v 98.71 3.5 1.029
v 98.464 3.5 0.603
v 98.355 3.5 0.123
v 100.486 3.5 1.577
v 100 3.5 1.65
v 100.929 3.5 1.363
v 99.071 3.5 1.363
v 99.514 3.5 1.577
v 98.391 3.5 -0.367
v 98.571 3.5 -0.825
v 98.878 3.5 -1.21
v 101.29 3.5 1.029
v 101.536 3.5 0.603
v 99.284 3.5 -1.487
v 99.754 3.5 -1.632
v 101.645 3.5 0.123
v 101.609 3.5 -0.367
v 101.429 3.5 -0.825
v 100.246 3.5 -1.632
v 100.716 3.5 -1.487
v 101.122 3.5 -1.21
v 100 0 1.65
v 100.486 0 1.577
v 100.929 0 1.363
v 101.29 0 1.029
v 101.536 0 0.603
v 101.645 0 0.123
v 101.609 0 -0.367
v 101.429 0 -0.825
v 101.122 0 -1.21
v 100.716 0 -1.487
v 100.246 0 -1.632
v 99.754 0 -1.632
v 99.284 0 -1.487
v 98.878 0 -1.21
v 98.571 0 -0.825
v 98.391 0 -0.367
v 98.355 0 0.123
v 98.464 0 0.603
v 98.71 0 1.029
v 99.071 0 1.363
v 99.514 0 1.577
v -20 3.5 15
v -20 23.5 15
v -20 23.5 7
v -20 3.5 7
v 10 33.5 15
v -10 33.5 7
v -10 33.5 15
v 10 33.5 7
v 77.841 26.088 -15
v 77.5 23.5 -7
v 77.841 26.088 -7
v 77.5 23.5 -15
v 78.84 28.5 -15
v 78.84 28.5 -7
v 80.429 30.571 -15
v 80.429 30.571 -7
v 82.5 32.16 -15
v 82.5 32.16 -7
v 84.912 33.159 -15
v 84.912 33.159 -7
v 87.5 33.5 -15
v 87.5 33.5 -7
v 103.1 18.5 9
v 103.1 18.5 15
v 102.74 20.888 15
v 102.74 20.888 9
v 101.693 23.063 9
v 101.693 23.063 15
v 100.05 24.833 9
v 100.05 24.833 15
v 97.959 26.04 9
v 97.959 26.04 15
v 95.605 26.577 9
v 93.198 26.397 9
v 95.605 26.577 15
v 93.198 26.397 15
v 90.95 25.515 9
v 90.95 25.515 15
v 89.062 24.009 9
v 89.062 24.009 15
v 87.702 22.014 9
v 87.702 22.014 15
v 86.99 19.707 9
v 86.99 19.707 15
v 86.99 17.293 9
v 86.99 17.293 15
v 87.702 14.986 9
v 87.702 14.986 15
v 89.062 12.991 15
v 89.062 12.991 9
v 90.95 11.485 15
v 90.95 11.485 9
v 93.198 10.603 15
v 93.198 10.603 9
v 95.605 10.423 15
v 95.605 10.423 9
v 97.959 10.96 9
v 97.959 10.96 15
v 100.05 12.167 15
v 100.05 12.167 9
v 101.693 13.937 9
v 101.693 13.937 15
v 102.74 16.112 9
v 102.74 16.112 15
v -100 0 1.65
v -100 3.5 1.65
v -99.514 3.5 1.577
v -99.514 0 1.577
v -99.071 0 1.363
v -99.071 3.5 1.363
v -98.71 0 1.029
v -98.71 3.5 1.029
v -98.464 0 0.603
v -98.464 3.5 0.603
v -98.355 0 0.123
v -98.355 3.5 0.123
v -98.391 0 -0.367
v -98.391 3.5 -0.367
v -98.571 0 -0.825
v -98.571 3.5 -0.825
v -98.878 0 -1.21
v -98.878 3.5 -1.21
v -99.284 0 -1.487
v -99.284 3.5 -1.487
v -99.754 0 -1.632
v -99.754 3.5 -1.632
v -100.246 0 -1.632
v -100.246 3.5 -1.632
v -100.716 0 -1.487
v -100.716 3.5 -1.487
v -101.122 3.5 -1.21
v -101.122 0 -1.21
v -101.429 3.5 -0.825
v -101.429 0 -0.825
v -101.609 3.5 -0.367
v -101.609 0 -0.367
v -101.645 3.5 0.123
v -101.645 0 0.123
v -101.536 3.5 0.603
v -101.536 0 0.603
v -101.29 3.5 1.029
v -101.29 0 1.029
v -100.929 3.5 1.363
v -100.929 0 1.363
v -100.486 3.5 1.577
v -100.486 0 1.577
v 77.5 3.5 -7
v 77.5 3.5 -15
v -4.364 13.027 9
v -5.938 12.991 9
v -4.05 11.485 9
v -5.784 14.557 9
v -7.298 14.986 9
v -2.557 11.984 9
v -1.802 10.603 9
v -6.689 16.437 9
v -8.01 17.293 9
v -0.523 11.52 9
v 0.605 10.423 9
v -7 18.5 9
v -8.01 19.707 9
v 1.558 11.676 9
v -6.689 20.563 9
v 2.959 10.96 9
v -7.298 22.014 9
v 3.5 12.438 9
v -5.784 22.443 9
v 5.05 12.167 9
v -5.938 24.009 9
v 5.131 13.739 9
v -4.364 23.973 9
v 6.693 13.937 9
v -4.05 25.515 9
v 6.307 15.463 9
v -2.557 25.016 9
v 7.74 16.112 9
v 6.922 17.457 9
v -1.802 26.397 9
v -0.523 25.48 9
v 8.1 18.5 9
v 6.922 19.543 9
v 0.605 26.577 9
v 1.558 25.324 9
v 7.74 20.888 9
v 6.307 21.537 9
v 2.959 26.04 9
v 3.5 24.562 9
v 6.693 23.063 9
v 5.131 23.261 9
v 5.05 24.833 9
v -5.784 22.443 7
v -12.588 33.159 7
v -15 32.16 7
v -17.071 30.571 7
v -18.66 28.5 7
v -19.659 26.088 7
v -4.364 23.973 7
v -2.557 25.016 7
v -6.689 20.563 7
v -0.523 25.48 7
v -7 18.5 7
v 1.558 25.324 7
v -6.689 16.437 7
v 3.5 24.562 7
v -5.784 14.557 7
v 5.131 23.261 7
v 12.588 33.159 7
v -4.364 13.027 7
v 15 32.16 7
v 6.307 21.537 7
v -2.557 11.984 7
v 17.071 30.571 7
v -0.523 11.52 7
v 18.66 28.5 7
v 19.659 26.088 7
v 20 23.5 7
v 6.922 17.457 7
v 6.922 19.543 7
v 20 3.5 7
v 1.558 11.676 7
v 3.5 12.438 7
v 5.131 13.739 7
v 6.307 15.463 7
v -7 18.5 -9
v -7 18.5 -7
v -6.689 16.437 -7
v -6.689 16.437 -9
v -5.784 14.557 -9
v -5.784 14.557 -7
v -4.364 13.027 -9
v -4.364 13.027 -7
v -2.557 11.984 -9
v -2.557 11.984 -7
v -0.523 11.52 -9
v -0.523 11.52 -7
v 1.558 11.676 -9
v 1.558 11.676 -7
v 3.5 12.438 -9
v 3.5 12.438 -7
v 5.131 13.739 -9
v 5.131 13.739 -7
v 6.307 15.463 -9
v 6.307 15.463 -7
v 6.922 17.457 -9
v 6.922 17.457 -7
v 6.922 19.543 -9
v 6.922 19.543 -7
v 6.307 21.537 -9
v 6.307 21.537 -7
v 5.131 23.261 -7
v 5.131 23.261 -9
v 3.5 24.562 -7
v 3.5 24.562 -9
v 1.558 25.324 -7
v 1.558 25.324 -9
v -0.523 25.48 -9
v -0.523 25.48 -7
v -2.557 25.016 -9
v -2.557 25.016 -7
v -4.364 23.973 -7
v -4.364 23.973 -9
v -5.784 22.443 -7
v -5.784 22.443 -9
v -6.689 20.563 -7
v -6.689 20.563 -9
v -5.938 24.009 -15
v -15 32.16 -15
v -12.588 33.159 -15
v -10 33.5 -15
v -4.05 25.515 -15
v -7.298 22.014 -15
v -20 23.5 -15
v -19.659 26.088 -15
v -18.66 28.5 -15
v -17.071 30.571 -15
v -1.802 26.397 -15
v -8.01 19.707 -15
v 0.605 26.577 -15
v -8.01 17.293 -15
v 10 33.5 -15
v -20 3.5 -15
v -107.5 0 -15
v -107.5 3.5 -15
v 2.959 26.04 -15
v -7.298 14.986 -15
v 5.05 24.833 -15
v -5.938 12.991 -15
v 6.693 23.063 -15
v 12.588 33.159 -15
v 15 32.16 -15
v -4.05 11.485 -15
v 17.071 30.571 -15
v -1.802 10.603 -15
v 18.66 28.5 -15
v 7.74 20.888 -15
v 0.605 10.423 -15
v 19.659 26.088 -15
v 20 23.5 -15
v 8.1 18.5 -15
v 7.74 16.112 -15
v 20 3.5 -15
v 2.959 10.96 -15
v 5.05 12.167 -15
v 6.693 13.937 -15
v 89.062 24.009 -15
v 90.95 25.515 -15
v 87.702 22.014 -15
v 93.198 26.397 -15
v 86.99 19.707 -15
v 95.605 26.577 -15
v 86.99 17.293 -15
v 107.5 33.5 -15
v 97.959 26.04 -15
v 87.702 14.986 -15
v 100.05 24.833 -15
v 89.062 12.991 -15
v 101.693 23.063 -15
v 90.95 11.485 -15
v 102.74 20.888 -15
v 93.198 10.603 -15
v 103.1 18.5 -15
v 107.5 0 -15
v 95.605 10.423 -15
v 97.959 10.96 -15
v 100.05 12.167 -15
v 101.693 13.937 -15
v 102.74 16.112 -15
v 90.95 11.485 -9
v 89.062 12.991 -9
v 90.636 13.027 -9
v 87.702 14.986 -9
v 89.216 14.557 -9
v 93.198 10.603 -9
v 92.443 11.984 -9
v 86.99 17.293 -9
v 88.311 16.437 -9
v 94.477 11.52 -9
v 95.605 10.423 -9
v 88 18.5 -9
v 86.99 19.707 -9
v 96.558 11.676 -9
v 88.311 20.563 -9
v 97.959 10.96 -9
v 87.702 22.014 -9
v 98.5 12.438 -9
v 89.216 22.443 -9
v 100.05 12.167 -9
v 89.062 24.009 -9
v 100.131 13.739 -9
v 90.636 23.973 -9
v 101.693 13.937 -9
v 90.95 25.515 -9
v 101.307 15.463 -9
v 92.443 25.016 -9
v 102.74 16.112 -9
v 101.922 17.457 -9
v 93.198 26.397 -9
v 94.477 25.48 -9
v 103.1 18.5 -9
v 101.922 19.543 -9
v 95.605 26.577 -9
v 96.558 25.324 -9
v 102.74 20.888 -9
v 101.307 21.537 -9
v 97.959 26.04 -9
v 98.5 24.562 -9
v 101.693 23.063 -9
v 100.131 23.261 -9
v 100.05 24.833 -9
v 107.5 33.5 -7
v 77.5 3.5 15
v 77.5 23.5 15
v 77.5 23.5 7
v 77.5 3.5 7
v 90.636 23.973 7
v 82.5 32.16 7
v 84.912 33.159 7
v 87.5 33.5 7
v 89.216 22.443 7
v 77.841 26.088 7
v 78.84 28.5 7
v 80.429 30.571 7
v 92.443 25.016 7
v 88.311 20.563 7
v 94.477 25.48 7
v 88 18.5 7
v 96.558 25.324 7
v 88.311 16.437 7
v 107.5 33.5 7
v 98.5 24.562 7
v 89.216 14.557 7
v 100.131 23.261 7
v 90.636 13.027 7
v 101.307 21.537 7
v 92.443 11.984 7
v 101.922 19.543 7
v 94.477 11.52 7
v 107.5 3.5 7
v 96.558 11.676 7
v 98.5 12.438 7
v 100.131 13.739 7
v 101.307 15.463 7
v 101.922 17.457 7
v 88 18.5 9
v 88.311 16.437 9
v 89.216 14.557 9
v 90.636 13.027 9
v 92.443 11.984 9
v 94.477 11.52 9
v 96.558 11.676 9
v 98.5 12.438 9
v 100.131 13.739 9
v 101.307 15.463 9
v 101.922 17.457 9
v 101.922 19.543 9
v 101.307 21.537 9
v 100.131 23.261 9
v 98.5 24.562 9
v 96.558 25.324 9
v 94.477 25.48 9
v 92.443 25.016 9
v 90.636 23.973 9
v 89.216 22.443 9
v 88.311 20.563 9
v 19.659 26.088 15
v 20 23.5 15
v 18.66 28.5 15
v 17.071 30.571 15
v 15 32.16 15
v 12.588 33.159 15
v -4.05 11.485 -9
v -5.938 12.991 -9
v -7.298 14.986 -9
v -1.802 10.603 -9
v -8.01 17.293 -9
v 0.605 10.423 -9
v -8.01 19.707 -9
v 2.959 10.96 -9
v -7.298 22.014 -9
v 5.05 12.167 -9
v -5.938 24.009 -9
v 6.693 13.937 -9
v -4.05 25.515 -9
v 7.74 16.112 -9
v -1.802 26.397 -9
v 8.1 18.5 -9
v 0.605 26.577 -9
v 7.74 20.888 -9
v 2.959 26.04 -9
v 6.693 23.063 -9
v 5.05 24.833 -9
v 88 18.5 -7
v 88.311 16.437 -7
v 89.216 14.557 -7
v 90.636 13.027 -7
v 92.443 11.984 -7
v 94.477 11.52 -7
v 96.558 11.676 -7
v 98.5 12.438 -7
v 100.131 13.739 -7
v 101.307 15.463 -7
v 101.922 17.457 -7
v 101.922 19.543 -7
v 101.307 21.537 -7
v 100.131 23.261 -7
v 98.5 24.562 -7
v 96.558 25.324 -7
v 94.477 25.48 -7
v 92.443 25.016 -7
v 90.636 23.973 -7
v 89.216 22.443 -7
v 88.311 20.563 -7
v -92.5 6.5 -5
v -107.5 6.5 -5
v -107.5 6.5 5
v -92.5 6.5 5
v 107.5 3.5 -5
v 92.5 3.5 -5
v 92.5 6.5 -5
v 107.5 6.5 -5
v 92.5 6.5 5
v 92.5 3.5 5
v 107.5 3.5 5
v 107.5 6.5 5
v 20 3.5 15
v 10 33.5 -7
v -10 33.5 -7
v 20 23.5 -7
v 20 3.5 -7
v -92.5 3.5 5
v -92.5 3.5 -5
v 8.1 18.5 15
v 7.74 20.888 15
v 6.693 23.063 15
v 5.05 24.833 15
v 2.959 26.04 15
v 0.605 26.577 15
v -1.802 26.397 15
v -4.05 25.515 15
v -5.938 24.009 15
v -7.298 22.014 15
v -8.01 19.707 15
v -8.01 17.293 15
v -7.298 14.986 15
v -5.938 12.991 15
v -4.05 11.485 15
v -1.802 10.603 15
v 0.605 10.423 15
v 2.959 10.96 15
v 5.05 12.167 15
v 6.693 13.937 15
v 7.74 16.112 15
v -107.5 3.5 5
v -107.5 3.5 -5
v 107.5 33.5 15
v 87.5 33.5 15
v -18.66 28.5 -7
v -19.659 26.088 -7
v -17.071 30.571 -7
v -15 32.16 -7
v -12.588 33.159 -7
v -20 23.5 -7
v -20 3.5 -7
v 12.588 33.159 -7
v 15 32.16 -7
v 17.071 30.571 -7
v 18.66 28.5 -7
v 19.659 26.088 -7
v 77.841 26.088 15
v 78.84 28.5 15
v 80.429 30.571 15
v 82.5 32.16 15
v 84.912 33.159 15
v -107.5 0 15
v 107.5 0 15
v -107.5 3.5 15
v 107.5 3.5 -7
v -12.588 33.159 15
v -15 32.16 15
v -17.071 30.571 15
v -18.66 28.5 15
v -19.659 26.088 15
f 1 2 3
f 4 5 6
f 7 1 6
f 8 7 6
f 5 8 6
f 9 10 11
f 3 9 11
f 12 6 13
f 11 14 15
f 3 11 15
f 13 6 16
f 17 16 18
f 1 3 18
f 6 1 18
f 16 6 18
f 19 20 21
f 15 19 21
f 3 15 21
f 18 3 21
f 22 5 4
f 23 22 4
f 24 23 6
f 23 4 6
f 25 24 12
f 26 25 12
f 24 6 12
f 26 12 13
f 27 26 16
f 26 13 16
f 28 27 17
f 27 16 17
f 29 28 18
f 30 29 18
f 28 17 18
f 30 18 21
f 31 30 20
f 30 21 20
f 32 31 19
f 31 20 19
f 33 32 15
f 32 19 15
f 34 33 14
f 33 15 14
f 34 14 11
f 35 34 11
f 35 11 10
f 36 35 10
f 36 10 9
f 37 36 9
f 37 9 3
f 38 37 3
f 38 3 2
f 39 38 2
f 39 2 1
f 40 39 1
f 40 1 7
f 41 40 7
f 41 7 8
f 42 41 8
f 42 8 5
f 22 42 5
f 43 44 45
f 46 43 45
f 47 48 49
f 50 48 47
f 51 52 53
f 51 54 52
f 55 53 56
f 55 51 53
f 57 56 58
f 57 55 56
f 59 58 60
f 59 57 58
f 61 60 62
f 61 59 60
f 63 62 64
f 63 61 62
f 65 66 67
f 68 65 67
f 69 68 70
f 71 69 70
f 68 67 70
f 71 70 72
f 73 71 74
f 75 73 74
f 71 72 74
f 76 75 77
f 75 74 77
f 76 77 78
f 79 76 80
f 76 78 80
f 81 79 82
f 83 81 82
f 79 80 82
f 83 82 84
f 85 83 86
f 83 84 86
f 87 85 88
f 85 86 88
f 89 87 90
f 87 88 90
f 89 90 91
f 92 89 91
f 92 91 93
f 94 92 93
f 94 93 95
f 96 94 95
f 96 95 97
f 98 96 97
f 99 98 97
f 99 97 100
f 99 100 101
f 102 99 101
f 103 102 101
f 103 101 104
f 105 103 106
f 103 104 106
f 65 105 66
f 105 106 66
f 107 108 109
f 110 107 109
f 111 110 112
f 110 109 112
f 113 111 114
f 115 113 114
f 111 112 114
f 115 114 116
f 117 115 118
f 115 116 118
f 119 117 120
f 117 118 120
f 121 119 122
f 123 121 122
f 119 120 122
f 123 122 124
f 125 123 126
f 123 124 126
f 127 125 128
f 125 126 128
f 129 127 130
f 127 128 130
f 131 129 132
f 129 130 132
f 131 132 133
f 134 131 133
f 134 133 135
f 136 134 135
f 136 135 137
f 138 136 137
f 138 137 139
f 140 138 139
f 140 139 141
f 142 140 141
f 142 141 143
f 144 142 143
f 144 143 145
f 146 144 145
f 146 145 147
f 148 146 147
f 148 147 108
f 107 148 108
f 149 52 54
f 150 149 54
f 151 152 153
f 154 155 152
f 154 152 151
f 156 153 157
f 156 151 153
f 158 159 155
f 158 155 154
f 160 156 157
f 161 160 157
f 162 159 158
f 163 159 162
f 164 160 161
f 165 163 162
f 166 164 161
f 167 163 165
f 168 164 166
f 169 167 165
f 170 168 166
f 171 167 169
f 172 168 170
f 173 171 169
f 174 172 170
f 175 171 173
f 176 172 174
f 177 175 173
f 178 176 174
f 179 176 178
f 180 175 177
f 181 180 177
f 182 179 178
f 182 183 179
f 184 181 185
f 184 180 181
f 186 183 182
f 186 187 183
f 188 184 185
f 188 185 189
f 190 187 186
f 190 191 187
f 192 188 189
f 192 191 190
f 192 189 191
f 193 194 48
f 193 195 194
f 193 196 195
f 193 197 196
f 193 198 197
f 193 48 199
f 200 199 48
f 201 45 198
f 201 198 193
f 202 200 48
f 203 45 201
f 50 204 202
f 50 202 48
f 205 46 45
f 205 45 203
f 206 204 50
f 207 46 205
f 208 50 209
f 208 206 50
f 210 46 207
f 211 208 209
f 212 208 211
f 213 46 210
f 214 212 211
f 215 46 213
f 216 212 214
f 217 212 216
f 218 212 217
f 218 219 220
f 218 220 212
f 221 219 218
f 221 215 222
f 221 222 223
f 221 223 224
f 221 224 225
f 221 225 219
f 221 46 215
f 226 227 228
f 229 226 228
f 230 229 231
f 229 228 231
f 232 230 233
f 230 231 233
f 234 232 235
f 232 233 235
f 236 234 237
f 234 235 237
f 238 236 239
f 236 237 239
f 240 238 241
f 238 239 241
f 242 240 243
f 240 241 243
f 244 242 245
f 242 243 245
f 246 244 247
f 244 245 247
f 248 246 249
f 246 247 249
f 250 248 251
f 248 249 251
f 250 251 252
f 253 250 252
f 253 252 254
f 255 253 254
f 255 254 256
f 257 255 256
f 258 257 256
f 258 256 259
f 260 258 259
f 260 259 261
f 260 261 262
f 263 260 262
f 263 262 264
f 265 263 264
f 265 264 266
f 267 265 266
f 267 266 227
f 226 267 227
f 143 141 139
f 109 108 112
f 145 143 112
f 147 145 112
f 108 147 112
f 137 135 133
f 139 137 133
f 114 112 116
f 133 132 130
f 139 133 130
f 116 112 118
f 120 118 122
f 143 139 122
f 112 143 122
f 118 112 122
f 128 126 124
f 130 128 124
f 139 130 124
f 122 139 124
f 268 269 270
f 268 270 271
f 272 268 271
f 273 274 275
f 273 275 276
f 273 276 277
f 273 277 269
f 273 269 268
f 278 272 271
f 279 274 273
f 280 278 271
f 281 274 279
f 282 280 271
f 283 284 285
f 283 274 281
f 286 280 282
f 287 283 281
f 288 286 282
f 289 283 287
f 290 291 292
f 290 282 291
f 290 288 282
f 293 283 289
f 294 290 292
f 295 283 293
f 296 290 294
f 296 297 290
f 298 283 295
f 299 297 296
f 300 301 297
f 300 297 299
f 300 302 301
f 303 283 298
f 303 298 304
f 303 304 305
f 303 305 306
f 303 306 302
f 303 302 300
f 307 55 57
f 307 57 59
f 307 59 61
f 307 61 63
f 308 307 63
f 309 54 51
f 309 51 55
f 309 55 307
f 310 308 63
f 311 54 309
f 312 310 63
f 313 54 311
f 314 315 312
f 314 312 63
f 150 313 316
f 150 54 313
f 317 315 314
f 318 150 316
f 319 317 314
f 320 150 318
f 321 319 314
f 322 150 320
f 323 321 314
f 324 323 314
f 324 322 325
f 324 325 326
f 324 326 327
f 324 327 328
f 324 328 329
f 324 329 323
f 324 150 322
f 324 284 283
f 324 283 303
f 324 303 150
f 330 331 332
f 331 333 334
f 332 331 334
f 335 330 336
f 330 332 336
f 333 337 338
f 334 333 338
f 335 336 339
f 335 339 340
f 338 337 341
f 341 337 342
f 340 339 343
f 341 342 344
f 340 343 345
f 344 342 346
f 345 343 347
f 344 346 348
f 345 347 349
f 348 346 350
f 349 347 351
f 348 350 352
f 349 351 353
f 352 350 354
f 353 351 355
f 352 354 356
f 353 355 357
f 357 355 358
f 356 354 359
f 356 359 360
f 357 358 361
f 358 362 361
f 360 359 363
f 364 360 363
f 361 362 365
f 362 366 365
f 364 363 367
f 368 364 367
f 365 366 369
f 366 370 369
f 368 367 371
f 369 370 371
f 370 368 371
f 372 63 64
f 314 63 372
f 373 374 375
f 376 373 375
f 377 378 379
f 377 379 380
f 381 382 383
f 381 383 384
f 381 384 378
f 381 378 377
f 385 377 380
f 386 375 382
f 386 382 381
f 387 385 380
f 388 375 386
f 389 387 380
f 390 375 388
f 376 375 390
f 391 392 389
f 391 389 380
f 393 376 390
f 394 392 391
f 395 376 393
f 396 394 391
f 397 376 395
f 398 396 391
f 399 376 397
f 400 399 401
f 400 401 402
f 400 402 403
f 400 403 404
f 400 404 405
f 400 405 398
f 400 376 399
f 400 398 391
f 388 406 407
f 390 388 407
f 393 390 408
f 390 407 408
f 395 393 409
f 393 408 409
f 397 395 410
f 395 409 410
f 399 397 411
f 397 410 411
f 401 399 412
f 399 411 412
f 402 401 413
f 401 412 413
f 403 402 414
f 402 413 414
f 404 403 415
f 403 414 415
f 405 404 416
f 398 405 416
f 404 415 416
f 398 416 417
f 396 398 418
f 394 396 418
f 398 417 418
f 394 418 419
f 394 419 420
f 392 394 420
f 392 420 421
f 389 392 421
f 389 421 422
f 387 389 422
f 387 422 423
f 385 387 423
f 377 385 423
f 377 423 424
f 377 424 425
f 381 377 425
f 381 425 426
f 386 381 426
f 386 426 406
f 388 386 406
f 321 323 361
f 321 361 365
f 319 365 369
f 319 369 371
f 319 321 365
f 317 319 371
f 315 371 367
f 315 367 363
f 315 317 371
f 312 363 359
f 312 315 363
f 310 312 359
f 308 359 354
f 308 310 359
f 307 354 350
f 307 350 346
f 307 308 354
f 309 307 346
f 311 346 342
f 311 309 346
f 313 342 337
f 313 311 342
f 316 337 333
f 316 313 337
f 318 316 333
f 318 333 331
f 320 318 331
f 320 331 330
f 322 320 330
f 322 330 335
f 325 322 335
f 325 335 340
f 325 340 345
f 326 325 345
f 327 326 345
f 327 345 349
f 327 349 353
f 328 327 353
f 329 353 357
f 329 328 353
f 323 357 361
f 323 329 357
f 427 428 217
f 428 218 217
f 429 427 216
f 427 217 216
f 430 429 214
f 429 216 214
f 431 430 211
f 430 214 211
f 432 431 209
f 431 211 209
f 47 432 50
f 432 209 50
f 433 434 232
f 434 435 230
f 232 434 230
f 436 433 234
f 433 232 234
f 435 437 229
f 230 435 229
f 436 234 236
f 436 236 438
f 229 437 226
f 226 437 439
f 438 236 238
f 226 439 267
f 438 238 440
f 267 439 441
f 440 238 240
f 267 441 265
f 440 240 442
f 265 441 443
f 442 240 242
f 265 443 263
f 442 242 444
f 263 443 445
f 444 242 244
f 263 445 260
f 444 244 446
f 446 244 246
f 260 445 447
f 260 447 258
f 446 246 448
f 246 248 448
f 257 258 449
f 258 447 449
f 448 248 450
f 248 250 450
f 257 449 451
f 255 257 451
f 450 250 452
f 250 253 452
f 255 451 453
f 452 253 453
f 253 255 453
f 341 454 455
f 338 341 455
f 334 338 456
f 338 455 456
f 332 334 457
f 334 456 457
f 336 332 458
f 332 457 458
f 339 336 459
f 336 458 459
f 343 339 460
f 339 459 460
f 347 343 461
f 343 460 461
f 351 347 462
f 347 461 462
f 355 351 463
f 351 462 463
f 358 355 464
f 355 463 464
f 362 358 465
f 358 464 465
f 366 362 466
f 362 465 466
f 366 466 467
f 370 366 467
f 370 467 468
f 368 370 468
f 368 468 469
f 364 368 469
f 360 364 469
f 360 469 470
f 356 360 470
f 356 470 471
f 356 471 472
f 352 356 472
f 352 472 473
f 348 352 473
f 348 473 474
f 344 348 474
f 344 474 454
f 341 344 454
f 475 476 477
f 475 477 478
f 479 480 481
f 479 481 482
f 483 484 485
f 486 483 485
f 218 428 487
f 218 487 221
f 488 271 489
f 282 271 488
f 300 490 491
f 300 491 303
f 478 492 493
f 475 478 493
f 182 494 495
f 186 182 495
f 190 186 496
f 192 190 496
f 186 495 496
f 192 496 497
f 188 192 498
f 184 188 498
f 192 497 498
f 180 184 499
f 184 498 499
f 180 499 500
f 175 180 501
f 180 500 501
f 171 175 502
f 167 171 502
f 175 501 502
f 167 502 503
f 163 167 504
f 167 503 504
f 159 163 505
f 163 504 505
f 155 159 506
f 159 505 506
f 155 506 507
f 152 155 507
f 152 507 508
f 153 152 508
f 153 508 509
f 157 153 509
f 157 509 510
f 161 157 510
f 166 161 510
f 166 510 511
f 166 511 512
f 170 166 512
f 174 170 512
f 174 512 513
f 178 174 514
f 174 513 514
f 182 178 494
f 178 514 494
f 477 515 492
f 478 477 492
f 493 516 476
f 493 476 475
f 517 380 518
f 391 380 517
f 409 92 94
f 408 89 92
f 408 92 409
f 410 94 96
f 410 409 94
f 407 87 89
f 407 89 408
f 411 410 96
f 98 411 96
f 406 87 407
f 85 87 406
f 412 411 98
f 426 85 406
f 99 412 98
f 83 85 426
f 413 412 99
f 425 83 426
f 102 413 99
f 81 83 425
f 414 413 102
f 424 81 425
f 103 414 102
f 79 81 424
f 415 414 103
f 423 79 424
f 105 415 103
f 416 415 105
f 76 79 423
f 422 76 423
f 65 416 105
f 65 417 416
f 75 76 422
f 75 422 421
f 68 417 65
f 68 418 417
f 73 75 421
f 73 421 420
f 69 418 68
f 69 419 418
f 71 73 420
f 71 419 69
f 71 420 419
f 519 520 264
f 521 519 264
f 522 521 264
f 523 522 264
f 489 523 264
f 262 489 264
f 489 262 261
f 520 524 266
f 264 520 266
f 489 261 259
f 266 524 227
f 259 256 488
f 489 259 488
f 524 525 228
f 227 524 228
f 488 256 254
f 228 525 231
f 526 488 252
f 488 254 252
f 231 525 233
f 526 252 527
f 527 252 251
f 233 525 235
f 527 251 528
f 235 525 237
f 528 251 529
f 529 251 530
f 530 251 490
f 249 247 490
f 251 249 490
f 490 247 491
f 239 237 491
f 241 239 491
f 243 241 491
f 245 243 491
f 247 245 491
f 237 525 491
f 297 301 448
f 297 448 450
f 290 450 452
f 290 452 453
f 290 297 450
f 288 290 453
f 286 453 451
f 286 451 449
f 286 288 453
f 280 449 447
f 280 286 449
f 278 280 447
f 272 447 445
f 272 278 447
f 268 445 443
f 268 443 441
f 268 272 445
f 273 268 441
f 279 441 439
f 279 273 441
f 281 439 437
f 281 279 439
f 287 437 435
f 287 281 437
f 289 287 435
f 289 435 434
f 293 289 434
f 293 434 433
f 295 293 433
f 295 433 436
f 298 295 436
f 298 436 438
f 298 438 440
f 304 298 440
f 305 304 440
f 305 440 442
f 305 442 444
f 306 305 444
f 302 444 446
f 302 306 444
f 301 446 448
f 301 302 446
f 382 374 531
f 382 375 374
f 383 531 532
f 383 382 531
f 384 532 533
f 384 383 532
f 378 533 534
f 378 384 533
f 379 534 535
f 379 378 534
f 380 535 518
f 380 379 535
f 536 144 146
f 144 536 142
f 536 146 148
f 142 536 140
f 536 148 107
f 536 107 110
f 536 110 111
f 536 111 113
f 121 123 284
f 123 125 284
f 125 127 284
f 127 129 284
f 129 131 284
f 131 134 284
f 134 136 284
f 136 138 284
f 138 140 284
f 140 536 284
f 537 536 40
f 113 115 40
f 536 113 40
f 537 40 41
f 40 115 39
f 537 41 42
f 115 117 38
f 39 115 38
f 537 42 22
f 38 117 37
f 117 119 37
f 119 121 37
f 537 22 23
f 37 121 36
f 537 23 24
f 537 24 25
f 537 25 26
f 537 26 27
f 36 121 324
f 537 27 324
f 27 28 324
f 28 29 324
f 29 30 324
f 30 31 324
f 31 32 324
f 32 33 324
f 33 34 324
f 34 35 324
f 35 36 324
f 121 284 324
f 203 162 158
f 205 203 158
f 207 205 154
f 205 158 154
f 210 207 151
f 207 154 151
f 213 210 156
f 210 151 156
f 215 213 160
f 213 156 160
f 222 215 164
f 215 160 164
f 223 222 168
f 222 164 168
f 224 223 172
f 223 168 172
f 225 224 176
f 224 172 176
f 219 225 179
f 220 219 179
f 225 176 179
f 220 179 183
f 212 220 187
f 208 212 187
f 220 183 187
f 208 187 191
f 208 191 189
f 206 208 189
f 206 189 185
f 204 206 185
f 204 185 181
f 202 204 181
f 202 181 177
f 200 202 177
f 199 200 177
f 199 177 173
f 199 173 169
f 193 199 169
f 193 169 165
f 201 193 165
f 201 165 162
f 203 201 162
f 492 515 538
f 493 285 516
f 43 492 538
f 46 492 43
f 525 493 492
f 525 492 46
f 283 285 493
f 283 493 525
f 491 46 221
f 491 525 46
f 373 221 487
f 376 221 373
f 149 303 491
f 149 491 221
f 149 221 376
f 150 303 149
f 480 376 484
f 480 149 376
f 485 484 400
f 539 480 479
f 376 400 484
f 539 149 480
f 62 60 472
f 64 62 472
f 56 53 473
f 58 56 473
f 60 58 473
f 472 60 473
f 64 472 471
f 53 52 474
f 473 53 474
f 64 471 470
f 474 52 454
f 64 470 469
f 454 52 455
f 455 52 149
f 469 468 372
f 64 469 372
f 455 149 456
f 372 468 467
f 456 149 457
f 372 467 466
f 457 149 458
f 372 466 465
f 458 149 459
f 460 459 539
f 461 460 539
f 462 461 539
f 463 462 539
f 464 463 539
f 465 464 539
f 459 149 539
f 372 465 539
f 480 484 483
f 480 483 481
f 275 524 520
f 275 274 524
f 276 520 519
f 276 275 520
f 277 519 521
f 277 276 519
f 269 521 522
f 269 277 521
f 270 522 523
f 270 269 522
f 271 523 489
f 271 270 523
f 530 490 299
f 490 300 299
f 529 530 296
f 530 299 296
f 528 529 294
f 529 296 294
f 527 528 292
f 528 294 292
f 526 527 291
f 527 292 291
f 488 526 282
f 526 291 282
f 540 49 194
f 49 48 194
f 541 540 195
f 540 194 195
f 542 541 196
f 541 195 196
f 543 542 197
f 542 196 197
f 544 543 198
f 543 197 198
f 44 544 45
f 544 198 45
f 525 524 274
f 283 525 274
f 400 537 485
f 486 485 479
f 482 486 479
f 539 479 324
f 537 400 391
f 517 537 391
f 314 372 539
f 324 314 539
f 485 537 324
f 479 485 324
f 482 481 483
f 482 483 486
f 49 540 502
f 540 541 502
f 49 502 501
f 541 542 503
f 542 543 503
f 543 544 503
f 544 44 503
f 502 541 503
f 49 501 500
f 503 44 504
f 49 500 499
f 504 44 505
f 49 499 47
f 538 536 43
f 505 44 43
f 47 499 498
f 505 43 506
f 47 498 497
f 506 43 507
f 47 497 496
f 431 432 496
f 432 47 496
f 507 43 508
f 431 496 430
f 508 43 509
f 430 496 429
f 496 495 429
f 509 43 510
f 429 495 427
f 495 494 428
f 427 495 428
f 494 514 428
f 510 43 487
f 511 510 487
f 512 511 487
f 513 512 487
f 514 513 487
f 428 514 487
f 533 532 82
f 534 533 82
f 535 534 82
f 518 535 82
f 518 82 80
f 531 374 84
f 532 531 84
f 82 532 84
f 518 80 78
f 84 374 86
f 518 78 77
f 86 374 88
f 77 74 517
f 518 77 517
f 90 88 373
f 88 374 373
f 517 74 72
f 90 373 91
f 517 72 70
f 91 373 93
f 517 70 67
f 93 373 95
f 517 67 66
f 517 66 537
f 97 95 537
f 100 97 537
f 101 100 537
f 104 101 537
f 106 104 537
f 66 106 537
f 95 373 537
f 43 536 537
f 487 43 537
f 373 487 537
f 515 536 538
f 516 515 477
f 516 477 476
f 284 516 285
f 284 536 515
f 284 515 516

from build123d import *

# Parameters (mm, degrees)
SKETCH2_W           = 215
SKETCH2_H           = 30
BOSS_EXTRUDE1_DEPTH = 3.5
SKETCH4_W           = 30
SKETCH4_H           = 8
SKETCH4_W_2         = 40
BOSS_EXTRUDE2_DEPTH = 30
SKETCH5_R           = 8.1
BEARING_HOLES_DEPTH = 6
SKETCH7_R           = 7
CUT_EXTRUDE2_DEPTH  = 116.128189424
FILLET1_R           = 10
HOLES_TBD_R         = 1.65
CUT_EXTRUDE1_DEPTH  = 113.611056296
SKETCH6_W           = 15
SKETCH6_H           = 10
BOSS_EXTRUDE3_DEPTH = 3


with BuildPart() as part:
    # Sketch2 → Boss-Extrude1 (new body)
    with BuildSketch(Plane(origin=(0, 0, 0), x_dir=(1, 0, 0), z_dir=(0, 1, 0))):
        Rectangle(SKETCH2_W, SKETCH2_H)
    extrude(amount=BOSS_EXTRUDE1_DEPTH)

    # Sketch4 → Boss-Extrude2 (add)
    with BuildSketch(Plane(origin=(0, 3.5, 0), x_dir=(1, 0, 0), z_dir=(0, 1, 0))):
        with Locations((92.5, -11)):
            Rectangle(SKETCH4_W, SKETCH4_H)
        with Locations((0, -11)):
            Rectangle(SKETCH4_W_2, SKETCH4_H)
        with Locations((0, 11)):
            Rectangle(SKETCH4_W_2, SKETCH4_H)
        with Locations((92.5, 11)):
            Rectangle(SKETCH4_W, SKETCH4_H)
    extrude(amount=BOSS_EXTRUDE2_DEPTH)

    # Sketch5 → Bearing holes (cut)
    with BuildSketch(Plane.XY.offset(15)):
        with Locations((0, 18.5)):
            Circle(SKETCH5_R)
        with Locations((95, 18.5)):
            Circle(SKETCH5_R)
    bearing_holes = extrude(amount=-BEARING_HOLES_DEPTH, mode=Mode.SUBTRACT)

    # Mirror1: Bearing holes across plane
    add(bearing_holes.mirror(Plane.XY), mode=Mode.SUBTRACT)

    # Sketch7 → Cut-Extrude2 (cut, through all)
    with BuildSketch(Plane.XY.offset(9)):
        with Locations(Location((0, 18.5, 0), (0, 0, 180))):
            Circle(SKETCH7_R)
        with Locations(Location((95, 18.5, 0), (0, 0, 180))):
            Circle(SKETCH7_R)
    extrude(amount=-CUT_EXTRUDE2_DEPTH, mode=Mode.SUBTRACT)

    # Fillet1
    fillet1_edges = [part.edges().sort_by_distance(p)[0] for p in [
        (77.5, 33.5, -11),
        (-20, 33.5, -11),
        (20, 33.5, -11),
        (-20, 33.5, 11),
        (20, 33.5, 11),
        (77.5, 33.5, 11),
    ]]
    fillet(fillet1_edges, radius=FILLET1_R)

    # HOLES TBD → Cut-Extrude1 (cut, through all)
    with BuildSketch(Plane(origin=(0, 3.5, 0), x_dir=(1, 0, 0), z_dir=(0, 1, 0))):
        with Locations(Location((-100, 0, 0), (0, 0, 270))):
            Circle(HOLES_TBD_R)
        with Locations(Location((100, 0, 0), (0, 0, 270))):
            Circle(HOLES_TBD_R)
    extrude(amount=-CUT_EXTRUDE1_DEPTH, mode=Mode.SUBTRACT)

    # Sketch6 → Boss-Extrude3 (add)
    with BuildSketch(Plane(origin=(0, 3.5, 0), x_dir=(1, 0, 0), z_dir=(0, 1, 0))):
        with Locations((-100, 0)):
            Rectangle(SKETCH6_W, SKETCH6_H)
        with Locations((100, 0)):
            Rectangle(SKETCH6_W, SKETCH6_H)
    extrude(amount=BOSS_EXTRUDE3_DEPTH)


solid = part.part
